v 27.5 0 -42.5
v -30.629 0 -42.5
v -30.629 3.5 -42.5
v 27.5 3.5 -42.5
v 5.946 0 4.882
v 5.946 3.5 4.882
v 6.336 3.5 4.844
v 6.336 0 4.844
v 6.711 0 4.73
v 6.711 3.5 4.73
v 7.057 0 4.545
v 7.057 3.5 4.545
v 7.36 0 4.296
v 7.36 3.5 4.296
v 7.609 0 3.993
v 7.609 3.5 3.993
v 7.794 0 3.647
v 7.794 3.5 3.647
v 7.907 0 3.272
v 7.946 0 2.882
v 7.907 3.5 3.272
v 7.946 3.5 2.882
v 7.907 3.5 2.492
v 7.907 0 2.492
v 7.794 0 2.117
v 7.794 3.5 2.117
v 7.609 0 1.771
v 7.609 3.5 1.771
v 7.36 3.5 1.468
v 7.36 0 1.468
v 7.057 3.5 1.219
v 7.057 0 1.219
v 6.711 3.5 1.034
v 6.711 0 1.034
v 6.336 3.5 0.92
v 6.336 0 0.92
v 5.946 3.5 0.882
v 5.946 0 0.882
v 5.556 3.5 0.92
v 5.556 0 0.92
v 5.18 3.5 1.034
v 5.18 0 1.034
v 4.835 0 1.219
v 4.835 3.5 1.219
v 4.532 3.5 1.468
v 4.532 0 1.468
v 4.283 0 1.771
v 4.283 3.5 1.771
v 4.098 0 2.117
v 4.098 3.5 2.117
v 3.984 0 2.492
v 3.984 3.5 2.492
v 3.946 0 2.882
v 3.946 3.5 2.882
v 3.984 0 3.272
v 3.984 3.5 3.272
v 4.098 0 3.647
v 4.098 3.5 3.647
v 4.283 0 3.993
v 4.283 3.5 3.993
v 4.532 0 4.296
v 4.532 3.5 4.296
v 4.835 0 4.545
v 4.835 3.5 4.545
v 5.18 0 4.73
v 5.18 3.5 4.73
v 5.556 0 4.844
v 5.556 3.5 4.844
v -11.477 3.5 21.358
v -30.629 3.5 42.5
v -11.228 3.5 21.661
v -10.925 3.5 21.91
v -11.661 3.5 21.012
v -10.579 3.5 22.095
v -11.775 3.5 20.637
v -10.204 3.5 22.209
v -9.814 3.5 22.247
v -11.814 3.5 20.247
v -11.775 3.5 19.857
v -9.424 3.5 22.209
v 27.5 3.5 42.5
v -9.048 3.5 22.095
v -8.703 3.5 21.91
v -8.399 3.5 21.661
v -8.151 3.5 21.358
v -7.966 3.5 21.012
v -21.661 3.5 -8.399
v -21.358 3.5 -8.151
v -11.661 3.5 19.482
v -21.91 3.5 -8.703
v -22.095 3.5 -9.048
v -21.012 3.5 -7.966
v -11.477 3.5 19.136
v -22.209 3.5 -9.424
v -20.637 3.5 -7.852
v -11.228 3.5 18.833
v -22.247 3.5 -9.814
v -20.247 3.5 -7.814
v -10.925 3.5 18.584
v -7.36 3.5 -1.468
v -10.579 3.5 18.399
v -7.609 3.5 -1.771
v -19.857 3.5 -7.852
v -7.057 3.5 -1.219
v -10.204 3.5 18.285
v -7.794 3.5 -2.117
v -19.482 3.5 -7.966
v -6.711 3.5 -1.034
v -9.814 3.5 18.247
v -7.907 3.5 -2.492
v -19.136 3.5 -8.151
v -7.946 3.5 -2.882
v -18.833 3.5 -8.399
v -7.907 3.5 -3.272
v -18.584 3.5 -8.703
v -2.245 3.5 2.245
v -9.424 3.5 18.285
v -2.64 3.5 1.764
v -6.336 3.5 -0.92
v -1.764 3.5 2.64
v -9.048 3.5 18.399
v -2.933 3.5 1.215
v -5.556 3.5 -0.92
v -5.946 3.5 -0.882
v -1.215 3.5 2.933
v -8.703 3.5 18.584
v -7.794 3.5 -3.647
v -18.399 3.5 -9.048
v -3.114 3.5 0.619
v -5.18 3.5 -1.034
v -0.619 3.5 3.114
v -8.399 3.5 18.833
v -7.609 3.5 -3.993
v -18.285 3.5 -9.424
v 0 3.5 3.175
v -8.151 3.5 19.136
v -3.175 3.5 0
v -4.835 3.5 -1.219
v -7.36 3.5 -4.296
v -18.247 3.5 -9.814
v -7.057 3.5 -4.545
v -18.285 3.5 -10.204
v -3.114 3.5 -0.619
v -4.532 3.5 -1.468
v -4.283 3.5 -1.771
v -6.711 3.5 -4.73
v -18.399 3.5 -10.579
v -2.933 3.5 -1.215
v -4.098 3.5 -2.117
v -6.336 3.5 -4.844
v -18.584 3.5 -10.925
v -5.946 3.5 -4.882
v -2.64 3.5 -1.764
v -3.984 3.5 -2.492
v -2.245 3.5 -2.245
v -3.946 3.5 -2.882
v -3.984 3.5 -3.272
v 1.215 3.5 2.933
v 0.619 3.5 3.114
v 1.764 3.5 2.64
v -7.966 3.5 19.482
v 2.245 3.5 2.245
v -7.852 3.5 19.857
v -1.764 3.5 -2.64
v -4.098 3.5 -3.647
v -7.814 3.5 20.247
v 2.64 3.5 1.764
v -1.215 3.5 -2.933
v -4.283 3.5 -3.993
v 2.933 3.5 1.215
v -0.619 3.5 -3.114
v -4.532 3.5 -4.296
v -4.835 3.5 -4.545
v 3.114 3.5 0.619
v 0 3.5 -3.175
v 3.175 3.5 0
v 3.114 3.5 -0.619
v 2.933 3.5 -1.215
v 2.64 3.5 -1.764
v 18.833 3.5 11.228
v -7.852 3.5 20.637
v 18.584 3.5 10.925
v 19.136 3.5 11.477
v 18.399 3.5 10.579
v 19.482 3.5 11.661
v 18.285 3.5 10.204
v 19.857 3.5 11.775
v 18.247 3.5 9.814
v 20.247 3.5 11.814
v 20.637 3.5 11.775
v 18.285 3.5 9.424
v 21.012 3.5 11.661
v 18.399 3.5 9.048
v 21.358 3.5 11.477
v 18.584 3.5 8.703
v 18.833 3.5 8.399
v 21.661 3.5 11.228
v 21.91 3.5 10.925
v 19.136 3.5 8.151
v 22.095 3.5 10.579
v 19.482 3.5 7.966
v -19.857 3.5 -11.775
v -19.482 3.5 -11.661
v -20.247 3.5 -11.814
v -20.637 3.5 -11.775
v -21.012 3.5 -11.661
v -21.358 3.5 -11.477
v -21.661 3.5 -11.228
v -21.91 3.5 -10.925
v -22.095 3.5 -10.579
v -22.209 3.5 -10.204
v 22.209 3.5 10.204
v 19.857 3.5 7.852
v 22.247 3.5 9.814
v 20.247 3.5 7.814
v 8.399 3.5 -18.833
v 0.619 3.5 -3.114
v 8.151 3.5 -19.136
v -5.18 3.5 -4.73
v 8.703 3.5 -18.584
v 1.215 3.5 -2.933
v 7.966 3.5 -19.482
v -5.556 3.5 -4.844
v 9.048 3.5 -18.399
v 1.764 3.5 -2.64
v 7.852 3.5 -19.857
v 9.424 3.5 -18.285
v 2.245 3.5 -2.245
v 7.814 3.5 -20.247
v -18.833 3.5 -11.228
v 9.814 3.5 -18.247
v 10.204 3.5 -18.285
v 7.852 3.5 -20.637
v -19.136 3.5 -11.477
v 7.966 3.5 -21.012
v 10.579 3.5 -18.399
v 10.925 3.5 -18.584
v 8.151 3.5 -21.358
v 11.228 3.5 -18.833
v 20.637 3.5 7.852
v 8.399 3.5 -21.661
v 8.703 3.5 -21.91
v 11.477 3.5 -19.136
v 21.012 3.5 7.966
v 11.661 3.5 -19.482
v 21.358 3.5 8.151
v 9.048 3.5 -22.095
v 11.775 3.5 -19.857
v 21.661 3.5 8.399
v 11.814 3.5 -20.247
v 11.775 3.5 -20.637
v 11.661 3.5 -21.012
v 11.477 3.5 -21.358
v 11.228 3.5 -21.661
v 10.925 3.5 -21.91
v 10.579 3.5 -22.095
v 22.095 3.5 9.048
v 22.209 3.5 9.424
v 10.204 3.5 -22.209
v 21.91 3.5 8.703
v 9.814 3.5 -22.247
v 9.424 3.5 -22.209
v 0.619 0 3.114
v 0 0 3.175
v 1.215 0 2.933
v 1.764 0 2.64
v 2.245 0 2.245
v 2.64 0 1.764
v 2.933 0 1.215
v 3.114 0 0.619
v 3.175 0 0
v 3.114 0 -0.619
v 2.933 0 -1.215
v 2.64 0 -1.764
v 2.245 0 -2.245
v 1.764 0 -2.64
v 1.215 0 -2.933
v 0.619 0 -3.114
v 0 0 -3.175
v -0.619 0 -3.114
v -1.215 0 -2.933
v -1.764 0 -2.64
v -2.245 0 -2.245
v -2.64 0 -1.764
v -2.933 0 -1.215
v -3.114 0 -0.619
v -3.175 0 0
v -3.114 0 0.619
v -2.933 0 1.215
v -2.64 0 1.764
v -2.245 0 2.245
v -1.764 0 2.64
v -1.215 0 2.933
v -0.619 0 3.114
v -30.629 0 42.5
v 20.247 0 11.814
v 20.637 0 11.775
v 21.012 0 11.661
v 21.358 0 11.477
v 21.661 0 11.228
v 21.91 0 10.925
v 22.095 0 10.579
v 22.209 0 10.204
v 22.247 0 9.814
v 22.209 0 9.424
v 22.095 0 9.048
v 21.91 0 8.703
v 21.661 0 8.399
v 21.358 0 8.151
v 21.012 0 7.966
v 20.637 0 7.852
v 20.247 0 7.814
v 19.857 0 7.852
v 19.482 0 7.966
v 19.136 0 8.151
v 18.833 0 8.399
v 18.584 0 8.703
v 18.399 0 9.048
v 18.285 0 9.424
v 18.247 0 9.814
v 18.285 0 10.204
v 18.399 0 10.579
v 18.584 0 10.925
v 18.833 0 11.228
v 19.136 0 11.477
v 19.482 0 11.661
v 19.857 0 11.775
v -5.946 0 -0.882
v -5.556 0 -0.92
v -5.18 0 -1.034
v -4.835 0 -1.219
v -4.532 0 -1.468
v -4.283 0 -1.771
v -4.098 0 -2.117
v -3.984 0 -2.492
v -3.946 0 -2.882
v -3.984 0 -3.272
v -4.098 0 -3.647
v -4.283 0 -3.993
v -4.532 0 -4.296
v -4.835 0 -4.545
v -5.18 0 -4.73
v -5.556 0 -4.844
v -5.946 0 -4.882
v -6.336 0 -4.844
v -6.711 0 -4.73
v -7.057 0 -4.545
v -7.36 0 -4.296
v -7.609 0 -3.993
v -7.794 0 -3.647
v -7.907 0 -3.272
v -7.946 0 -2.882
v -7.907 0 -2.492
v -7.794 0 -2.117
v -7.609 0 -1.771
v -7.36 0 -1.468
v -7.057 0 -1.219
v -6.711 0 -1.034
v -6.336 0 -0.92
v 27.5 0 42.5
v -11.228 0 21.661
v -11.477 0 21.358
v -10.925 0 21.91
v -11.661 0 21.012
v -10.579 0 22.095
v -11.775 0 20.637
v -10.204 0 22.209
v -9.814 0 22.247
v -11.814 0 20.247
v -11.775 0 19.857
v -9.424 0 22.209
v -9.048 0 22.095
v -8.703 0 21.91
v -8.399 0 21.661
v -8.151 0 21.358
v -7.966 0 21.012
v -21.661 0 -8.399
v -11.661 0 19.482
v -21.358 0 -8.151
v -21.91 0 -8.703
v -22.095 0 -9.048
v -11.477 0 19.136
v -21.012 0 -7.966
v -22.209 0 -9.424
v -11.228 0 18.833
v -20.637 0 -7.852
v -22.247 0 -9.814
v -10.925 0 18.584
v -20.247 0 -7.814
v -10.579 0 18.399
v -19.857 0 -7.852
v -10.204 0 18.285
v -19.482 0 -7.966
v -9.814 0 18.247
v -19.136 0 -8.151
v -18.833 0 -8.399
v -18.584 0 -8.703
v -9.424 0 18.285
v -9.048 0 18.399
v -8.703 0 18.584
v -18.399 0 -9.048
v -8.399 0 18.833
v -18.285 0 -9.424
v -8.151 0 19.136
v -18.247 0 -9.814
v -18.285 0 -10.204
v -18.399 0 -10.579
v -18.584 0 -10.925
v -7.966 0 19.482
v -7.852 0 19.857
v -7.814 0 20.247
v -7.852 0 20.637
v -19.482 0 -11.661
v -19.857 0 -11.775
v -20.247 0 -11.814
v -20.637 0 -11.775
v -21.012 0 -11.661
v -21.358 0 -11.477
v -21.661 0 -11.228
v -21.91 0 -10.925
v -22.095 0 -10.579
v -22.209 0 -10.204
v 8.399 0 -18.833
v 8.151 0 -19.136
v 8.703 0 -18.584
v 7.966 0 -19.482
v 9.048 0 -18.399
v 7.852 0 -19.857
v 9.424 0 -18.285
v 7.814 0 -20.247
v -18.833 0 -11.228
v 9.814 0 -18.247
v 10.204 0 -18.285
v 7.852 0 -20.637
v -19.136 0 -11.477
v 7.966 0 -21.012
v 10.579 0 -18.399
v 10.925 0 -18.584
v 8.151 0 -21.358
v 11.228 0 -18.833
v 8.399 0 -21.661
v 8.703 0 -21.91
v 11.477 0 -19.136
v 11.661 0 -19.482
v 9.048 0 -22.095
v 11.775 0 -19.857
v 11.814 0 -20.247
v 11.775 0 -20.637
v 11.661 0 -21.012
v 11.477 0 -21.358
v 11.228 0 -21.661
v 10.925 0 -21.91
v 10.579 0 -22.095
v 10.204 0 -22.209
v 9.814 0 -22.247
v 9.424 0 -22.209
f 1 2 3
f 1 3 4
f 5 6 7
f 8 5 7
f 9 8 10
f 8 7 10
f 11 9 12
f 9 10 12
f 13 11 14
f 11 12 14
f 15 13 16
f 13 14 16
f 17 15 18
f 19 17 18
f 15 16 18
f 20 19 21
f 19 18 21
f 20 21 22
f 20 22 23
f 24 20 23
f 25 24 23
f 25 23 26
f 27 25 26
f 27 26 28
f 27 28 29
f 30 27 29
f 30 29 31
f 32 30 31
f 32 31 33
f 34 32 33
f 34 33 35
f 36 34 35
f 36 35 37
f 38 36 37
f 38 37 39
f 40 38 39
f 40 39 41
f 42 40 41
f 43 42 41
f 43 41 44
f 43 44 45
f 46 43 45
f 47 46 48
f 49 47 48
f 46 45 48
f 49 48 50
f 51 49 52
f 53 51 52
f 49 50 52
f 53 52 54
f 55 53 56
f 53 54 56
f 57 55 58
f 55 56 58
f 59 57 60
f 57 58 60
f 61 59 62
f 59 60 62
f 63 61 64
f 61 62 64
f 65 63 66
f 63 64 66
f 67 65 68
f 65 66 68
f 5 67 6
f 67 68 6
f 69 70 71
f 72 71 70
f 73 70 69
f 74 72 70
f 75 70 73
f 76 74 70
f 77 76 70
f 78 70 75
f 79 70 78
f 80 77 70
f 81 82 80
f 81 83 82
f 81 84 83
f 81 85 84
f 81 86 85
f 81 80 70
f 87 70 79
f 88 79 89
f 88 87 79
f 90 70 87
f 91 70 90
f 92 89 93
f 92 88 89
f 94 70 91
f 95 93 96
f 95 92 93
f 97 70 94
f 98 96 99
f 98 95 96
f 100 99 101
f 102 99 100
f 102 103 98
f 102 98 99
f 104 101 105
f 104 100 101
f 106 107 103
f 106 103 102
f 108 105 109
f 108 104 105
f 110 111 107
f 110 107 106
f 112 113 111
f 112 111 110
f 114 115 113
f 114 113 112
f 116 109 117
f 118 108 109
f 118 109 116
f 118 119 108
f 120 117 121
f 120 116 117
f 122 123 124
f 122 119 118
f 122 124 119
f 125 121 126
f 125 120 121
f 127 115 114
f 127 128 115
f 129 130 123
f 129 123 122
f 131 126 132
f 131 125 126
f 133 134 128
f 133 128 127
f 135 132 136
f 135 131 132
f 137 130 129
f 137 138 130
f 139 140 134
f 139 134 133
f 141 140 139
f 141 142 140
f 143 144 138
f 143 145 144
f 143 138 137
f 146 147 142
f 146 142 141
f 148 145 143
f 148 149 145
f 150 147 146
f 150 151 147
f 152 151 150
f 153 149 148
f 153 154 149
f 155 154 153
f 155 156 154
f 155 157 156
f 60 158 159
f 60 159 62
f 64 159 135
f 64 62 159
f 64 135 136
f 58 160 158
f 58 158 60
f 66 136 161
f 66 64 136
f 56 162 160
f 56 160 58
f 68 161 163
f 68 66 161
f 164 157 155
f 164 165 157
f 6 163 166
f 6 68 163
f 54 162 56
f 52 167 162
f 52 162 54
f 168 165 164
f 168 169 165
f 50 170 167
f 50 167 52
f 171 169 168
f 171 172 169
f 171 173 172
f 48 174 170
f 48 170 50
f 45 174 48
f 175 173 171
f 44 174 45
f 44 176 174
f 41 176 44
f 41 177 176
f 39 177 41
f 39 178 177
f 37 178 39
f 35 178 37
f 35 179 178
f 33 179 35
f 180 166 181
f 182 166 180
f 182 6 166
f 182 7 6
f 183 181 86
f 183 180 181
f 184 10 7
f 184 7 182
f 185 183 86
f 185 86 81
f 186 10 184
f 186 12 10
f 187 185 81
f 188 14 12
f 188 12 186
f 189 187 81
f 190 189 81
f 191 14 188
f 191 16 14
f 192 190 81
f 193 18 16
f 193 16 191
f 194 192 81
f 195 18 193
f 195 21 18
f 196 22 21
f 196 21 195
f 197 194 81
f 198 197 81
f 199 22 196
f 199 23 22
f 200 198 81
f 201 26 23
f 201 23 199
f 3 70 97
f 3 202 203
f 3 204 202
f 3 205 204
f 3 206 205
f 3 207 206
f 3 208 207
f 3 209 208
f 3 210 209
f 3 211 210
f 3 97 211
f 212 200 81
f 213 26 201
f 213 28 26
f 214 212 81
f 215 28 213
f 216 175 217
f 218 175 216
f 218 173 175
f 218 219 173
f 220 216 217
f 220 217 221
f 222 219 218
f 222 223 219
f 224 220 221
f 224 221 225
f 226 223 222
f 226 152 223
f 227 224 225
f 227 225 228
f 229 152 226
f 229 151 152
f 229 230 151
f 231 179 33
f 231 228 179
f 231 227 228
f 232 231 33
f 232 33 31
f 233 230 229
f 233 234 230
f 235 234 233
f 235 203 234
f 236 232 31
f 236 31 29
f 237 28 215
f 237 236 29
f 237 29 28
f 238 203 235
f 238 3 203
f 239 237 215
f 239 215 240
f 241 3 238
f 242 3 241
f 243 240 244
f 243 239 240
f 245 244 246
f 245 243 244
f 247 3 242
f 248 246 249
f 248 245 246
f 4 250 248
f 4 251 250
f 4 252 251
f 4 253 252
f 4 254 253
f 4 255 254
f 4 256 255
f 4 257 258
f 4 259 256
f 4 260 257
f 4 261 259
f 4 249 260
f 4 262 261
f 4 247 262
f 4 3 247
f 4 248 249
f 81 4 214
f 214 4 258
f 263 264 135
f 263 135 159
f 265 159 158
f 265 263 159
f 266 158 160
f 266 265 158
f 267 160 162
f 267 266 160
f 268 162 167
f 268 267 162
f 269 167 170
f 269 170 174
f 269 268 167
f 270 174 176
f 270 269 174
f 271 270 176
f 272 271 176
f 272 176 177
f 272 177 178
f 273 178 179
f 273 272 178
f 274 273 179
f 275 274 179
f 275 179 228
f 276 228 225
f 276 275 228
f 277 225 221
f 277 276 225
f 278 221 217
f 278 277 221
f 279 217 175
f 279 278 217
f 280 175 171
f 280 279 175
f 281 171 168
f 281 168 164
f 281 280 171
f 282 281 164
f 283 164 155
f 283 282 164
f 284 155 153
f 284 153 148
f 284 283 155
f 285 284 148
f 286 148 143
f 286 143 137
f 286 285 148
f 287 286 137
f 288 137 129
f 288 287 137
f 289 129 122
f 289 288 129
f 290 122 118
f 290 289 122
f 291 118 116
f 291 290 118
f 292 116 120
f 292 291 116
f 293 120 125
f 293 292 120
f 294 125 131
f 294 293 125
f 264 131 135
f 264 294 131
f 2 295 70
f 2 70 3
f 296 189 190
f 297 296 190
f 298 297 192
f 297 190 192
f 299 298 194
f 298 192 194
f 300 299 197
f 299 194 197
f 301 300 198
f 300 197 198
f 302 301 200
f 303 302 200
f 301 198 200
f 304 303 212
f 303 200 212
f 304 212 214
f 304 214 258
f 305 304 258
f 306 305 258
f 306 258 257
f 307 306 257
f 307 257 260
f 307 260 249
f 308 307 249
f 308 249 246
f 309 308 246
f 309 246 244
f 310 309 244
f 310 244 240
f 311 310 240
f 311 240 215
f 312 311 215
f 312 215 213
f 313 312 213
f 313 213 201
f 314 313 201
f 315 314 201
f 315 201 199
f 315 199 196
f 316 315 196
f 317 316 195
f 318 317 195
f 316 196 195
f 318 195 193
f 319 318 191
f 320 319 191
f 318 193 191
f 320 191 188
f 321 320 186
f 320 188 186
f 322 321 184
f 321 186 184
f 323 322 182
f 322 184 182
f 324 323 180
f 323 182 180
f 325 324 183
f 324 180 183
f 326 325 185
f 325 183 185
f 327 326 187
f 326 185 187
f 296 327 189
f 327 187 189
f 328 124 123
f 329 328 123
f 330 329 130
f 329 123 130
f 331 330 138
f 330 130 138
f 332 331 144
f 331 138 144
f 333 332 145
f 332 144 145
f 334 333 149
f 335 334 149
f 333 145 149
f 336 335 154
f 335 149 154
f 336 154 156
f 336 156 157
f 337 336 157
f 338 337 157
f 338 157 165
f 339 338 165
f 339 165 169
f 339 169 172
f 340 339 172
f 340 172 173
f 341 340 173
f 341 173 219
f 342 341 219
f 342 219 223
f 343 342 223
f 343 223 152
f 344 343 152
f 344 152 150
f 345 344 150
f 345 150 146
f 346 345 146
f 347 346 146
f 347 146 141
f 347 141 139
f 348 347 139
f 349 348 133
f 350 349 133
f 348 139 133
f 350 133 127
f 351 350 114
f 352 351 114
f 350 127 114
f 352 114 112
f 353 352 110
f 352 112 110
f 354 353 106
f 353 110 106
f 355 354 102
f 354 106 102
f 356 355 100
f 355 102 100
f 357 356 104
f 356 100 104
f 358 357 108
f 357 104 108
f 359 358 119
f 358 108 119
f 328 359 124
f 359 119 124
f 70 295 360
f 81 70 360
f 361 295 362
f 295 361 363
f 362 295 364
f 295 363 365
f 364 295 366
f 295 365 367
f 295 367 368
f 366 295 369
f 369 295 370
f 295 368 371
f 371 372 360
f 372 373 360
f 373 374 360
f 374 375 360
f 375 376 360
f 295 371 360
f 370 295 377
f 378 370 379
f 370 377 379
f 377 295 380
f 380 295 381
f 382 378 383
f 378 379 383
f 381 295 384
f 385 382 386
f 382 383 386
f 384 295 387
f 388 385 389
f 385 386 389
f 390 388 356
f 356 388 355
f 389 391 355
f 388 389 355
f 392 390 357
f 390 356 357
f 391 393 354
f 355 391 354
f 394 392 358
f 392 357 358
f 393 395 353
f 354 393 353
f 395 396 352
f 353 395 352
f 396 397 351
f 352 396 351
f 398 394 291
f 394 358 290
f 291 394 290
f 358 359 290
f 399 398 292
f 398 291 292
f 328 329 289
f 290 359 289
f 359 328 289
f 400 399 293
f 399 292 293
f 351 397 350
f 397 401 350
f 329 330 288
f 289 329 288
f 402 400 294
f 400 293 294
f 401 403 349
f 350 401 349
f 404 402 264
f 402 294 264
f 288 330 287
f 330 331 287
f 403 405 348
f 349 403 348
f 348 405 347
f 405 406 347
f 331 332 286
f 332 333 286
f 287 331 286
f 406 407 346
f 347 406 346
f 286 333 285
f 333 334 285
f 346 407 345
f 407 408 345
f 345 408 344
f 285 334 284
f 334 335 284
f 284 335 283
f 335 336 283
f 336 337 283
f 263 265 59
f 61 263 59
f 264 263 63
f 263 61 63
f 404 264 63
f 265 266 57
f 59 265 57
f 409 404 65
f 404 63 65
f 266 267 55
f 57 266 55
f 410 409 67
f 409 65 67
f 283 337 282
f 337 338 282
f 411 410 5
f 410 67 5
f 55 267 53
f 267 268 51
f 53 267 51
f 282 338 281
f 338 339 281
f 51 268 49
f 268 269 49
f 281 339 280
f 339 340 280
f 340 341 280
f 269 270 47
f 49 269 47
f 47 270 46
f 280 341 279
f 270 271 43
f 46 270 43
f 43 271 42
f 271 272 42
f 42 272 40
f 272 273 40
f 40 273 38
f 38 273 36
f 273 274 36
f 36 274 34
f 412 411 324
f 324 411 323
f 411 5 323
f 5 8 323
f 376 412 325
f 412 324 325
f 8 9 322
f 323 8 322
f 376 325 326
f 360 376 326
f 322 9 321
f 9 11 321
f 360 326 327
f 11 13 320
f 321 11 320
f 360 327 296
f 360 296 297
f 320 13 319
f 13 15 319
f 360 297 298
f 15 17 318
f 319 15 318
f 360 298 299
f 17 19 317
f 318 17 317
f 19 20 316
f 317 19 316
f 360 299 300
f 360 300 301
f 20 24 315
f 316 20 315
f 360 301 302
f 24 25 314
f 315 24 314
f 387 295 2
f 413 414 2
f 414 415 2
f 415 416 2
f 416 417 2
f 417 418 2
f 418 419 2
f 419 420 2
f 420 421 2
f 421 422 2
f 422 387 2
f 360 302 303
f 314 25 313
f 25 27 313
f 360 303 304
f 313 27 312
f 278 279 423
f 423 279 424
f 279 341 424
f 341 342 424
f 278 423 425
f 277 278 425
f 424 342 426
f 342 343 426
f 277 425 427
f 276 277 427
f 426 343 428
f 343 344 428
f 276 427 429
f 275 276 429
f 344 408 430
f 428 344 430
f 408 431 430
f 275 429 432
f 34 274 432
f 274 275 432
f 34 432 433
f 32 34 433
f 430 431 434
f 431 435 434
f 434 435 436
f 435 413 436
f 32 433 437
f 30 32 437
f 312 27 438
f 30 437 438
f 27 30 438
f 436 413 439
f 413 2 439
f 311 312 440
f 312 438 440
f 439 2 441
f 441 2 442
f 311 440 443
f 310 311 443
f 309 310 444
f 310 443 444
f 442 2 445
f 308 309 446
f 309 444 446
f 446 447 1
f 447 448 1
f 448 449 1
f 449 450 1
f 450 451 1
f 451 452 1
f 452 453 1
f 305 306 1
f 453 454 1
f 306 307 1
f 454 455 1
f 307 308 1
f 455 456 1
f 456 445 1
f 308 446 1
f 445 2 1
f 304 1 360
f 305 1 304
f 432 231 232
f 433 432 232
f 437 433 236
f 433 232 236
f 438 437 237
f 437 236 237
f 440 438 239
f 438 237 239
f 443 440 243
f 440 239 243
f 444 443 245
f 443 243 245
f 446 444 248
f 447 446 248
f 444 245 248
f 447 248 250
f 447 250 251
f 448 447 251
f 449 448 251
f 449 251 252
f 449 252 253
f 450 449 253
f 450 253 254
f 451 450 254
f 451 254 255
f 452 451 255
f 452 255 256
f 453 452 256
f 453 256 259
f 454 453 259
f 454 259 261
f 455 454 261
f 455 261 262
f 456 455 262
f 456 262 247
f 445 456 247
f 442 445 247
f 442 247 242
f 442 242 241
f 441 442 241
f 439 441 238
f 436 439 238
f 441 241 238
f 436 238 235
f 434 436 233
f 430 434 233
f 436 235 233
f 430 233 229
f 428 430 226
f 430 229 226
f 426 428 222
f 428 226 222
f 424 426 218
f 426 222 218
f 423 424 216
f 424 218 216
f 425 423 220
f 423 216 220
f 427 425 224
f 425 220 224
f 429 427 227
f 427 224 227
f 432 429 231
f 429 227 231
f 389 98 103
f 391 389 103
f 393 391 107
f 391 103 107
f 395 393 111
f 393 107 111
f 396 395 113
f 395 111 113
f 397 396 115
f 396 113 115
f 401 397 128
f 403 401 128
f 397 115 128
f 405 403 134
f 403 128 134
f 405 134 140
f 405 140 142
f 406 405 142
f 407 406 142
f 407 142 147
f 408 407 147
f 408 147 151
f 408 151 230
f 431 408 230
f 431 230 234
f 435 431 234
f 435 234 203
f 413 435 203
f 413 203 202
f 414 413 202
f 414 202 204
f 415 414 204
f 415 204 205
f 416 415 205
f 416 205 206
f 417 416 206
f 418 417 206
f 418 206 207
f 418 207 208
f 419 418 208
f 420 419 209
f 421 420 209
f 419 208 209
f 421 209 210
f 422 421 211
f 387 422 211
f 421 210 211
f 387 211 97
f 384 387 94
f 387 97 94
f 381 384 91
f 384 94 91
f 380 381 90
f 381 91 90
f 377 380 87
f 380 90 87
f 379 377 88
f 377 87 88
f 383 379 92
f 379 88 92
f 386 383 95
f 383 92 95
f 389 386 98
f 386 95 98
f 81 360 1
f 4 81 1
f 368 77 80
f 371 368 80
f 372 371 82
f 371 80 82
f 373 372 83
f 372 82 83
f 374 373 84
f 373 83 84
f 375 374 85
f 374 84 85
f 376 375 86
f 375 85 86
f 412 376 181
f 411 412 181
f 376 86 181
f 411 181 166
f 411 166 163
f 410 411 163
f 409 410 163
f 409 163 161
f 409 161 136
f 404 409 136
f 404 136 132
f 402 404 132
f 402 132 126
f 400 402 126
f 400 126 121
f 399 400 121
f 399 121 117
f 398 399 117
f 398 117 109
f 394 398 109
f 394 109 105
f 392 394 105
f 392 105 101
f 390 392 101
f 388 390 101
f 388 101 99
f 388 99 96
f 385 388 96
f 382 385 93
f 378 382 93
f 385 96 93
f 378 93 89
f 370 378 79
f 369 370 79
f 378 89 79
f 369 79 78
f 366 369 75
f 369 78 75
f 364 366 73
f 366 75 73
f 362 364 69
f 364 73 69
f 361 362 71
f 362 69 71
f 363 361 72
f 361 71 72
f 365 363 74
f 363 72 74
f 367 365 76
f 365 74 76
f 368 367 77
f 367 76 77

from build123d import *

# Parameters (mm, degrees)
SKETCH_1_W          = 58.128760995
SKETCH_1_H          = 85
SKETCH_1_R          = 3.175
EXTRUDE_1_DEPTH     = 3.5
SKETCH_2_R          = 2
CUT_EXTRUDE_1_DEPTH = 53.503533215


with BuildPart() as part:
    # Эскиз1 → Вытянуть1 (new body)
    with BuildSketch(Plane(origin=(0, 0, 0), x_dir=(1, 0, 0), z_dir=(0, 1, 0))):
        with Locations((-1.564380498, 0)):
            Rectangle(SKETCH_1_W, SKETCH_1_H)
        with Locations(Location((0, 0, 0), (0, 0, 270))):
            Circle(SKETCH_1_R, mode=Mode.SUBTRACT)
    extrude(amount=EXTRUDE_1_DEPTH)

    # Эскиз2 → Вырез-Вытянуть1 (cut, through all)
    with BuildSketch(Plane(origin=(0, 3.5, 0), x_dir=(1, 0, 0), z_dir=(0, 1, 0))):
        with Locations(Location((-5.945819696, 2.881931911, 0), (0, 0, 270))):
            Circle(SKETCH_2_R)
        with Locations(Location((5.945819696, -2.881931911, 0), (0, 0, 270))):
            Circle(SKETCH_2_R)
        with Locations(Location((20.247006678, -9.813700656, 0), (0, 0, 270))):
            Circle(SKETCH_2_R)
        with Locations(Location((9.813700656, 20.247006678, 0), (0, 0, 270))):
            Circle(SKETCH_2_R)
        with Locations(Location((-9.813700656, -20.247006678, 0), (0, 0, 270))):
            Circle(SKETCH_2_R)
        with Locations(Location((-20.247006678, 9.813700656, 0), (0, 0, 270))):
            Circle(SKETCH_2_R)
    extrude(amount=-CUT_EXTRUDE_1_DEPTH, mode=Mode.SUBTRACT)


solid = part.part
